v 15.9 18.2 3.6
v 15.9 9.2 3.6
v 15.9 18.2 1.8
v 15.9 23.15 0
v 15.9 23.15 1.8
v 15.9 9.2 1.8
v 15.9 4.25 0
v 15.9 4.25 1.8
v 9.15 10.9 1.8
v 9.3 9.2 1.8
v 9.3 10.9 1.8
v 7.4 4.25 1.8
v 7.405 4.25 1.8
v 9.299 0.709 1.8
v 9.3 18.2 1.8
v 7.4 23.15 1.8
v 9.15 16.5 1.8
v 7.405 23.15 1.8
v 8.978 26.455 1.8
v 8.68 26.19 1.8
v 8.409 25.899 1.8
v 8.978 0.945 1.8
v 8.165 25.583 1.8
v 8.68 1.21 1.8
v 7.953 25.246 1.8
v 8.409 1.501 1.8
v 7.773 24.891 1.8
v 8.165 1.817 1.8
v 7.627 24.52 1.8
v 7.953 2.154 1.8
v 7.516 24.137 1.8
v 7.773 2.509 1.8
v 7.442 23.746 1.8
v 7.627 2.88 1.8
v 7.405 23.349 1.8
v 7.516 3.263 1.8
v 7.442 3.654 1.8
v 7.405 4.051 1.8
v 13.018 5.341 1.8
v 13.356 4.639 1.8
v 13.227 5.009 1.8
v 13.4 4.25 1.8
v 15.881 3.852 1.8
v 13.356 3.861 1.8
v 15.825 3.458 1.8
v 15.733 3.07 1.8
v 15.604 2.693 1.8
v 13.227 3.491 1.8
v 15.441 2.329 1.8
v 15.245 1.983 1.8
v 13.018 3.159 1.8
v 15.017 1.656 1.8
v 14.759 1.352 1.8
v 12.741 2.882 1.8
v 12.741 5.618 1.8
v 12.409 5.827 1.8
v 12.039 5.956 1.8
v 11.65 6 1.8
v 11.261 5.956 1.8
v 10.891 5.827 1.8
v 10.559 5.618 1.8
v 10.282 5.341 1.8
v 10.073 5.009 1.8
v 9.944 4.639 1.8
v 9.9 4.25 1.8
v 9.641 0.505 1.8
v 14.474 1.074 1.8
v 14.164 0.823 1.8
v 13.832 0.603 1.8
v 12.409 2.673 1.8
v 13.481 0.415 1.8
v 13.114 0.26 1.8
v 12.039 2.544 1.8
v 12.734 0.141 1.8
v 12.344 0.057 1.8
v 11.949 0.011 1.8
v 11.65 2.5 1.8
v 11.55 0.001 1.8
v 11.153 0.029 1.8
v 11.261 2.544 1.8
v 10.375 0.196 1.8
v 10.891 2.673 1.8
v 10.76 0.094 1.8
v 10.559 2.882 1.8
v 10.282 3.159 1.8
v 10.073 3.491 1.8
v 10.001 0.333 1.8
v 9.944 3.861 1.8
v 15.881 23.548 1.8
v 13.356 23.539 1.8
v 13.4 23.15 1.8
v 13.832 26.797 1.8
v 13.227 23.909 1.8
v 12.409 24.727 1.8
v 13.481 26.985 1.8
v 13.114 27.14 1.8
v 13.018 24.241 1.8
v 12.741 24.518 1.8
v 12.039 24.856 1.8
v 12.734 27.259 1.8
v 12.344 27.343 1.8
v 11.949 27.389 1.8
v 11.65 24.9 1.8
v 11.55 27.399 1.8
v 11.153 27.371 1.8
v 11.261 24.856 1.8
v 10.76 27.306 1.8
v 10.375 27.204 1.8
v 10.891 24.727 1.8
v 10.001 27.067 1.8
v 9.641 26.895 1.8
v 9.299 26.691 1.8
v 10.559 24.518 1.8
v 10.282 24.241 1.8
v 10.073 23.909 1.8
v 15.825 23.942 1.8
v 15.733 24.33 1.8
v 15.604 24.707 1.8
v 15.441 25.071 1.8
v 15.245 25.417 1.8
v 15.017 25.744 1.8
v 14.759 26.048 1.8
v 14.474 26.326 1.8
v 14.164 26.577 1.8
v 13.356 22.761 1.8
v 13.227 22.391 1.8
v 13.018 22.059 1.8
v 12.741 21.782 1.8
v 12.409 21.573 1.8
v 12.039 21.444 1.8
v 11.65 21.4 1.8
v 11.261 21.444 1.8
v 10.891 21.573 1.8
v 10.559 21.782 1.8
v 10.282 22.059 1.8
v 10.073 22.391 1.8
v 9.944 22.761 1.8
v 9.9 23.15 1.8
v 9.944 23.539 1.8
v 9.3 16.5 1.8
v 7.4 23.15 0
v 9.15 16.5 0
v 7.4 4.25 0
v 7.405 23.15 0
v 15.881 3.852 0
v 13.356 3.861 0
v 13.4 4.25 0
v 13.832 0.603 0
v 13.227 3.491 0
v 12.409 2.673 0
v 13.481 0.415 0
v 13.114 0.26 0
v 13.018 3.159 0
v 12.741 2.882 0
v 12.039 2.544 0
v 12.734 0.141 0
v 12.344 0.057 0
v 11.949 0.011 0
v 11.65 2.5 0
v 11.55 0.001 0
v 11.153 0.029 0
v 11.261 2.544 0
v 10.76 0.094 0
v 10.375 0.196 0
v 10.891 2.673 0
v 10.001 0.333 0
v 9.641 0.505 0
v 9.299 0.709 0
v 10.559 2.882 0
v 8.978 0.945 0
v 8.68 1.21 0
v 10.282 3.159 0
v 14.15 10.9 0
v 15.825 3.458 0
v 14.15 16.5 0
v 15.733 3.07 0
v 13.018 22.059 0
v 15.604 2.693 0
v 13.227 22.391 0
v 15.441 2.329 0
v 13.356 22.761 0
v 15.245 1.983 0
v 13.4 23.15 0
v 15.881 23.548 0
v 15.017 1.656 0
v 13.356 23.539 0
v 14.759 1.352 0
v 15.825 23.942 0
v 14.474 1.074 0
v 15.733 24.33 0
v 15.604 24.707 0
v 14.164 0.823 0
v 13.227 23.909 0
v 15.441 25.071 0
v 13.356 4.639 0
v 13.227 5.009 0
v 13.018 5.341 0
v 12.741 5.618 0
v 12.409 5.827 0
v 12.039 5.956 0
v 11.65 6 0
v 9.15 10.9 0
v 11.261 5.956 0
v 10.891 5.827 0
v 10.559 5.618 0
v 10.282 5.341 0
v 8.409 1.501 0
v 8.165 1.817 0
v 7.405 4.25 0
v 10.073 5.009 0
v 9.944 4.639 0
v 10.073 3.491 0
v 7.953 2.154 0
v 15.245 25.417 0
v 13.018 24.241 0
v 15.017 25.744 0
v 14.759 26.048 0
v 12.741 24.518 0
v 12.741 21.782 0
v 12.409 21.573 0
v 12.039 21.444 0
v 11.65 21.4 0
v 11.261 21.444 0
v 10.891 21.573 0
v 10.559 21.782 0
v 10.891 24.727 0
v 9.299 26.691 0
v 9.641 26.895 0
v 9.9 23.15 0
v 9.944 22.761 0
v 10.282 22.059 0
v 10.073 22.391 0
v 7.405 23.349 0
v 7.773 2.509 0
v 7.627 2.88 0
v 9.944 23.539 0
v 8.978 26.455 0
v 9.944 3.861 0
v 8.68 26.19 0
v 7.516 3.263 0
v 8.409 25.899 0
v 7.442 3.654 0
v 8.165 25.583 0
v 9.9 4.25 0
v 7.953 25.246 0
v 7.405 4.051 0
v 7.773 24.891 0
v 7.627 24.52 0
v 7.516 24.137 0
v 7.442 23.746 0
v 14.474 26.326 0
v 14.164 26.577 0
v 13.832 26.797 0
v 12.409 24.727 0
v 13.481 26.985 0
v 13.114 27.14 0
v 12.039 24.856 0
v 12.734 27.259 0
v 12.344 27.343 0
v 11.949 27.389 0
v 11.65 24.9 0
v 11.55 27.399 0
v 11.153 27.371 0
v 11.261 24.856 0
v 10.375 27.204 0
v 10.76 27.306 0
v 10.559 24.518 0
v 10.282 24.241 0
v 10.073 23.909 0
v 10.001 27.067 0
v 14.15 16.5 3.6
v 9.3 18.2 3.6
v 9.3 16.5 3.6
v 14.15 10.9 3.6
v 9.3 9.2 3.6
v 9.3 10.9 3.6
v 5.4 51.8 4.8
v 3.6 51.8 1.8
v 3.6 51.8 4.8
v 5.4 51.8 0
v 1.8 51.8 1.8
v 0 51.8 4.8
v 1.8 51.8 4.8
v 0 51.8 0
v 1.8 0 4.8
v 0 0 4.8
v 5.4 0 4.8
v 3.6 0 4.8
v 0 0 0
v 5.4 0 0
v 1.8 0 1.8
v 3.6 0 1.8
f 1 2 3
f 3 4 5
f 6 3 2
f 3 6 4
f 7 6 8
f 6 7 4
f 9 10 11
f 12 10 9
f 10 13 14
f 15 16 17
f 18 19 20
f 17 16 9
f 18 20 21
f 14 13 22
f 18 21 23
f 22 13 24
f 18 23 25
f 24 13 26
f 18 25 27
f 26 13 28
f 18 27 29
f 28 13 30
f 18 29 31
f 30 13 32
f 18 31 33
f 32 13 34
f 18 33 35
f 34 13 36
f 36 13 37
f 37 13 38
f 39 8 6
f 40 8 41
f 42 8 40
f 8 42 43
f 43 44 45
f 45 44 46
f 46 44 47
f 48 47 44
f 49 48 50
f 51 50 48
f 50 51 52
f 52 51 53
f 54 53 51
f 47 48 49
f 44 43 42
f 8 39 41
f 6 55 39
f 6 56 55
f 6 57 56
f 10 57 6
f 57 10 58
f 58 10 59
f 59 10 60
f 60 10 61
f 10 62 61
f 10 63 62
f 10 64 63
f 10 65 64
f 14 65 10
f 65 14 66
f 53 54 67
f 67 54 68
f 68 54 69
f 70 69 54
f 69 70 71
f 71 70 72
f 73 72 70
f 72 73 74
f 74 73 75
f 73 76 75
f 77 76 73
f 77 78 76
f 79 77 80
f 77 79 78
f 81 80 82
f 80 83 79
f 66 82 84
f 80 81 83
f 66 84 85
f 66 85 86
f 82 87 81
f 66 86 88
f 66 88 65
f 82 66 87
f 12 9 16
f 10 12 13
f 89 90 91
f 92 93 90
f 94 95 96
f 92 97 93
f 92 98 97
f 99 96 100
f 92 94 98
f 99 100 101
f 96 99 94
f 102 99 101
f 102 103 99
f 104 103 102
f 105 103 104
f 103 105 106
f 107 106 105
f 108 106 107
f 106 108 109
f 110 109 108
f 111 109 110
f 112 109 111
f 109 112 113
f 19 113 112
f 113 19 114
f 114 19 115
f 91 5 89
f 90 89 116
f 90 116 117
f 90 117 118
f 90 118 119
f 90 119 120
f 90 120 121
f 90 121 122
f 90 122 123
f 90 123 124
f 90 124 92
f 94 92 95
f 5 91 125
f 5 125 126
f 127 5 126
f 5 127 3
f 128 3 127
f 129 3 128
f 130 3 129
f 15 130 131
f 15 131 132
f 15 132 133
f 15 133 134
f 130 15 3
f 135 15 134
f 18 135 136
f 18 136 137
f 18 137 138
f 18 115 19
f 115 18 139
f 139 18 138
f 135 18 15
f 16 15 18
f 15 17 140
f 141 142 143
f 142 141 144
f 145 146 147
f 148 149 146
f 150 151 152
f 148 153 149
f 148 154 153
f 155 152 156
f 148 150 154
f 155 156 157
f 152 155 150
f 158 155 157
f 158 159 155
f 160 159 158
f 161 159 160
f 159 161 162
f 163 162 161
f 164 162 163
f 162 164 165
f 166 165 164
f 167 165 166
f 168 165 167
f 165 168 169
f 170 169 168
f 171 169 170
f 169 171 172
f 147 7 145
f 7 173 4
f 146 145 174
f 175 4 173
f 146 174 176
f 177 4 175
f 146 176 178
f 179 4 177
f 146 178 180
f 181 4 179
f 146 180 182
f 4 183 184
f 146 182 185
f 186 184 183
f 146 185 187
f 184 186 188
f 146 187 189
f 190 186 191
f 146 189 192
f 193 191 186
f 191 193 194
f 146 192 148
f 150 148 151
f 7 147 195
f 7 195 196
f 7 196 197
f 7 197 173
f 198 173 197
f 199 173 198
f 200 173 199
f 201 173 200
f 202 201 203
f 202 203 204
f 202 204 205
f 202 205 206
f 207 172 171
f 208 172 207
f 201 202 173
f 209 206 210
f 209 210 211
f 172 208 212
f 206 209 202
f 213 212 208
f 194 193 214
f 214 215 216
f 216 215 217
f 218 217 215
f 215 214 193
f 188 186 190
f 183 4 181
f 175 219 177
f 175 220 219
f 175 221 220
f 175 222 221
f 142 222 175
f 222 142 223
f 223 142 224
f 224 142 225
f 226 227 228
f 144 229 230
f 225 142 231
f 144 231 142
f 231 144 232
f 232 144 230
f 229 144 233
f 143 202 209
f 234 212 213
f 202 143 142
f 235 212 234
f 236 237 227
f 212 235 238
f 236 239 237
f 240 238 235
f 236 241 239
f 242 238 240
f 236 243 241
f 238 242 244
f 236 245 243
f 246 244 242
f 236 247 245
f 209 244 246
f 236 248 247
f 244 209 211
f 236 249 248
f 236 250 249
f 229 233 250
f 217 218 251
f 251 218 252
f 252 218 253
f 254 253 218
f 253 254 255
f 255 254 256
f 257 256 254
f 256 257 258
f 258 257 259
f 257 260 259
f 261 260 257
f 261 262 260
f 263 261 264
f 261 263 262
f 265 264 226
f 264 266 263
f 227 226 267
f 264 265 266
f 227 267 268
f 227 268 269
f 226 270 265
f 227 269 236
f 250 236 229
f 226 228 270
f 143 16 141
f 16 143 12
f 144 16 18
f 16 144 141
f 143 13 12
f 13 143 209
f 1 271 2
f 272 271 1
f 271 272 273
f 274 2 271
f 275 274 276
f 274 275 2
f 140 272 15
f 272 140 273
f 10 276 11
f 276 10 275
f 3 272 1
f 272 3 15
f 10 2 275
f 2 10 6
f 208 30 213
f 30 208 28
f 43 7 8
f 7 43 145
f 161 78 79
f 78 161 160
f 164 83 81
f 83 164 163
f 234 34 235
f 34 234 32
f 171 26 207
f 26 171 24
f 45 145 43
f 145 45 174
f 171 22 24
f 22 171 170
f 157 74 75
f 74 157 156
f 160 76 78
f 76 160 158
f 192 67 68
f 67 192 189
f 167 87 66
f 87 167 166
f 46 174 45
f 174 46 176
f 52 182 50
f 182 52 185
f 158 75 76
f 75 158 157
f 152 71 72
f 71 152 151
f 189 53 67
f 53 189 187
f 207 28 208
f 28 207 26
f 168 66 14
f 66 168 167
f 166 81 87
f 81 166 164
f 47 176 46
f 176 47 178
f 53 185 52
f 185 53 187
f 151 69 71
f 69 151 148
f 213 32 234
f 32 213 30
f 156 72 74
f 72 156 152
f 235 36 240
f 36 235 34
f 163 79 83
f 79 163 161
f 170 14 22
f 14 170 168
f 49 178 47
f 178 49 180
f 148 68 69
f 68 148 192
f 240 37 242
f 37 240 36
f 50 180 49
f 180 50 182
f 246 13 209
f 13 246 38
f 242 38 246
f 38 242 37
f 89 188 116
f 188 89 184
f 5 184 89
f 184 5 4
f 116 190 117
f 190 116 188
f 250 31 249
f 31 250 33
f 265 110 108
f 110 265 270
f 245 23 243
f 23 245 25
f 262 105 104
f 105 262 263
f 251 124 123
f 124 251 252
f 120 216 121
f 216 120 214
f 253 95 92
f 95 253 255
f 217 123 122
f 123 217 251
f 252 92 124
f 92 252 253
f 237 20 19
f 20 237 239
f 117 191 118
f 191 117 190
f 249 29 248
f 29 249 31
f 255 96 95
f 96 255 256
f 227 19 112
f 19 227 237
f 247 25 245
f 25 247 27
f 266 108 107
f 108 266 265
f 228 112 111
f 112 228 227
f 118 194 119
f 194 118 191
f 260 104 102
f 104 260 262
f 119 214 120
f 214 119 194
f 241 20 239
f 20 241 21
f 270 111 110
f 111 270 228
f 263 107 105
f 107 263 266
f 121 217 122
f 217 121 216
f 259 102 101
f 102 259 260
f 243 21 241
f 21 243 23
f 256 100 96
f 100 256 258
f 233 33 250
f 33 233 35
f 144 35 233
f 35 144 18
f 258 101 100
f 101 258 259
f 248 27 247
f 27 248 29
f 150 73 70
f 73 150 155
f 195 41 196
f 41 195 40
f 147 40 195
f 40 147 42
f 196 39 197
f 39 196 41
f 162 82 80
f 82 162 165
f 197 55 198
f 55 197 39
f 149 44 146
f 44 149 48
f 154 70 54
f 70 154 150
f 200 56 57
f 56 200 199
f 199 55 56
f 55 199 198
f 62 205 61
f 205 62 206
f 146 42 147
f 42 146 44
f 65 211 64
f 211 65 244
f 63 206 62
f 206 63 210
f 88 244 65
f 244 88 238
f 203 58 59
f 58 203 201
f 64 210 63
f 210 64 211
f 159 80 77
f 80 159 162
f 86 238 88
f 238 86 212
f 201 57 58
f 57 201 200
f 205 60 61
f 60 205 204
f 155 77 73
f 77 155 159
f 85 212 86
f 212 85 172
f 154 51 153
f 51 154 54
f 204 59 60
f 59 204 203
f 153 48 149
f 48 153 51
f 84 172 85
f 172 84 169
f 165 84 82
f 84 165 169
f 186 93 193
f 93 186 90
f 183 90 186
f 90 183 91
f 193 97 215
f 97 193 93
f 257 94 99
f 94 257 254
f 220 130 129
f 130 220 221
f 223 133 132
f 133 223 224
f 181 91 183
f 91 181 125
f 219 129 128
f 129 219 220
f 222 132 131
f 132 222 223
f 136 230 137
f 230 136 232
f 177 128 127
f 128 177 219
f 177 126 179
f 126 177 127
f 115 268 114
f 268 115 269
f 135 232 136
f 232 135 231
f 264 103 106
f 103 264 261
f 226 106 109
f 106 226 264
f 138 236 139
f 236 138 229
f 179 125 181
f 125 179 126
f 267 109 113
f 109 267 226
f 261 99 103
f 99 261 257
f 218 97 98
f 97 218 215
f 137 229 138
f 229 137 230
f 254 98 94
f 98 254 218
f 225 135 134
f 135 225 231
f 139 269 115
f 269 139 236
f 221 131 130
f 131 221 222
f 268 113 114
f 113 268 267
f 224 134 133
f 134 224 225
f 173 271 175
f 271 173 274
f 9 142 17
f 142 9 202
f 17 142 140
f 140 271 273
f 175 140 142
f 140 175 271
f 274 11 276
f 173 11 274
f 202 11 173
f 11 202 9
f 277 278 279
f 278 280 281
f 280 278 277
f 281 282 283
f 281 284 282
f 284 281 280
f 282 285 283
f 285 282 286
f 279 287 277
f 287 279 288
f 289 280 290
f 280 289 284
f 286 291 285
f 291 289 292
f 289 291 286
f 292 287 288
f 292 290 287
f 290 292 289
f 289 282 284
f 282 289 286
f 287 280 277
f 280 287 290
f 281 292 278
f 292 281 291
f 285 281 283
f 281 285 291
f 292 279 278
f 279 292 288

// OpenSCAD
// Platinenhalter

// Resolution for 3D printing:
$fa = 1;
$fs = 0.4;

// Allgemeines:
delta                  =   0.1; // Standard Durchdringung

// Luft zwischen getrennten Teilen:
luft                   =   0.2;

// Gehäuse Dicke
wand_dicke             =   1.8;

// Schiene:
schiene_laenge         =  50.0;
schiene_tiefe          =   3.0;

// Platine:
platinen_dicke         =   1.6 + luft;

// Schraubenloch
schloch_durchm         =   3.5;
schloch_abstand        =   2.5;

schiene_tot_x          =   schiene_laenge + wand_dicke;
schiene_tot_y          =     2 * wand_dicke + platinen_dicke;
schiene_tot_z          =   schiene_tiefe + wand_dicke;

rundung_durchmesser    =  schloch_durchm + 2 * schloch_abstand;

stand_tot_x            =  rundung_durchmesser;
stand_tot_y            =  schiene_tot_y + 2 * schloch_abstand +
                             2 * rundung_durchmesser;

module schiene() {
    color("red", 1.0) {
        difference() {
            cube([schiene_tot_x,
                  schiene_tot_y,
                  schiene_tot_z]);
            translate([-delta, wand_dicke, wand_dicke])
                cube([schiene_tot_x + 2 * delta,
                      platinen_dicke,
                      schiene_tiefe + delta]);
        };
    }
}

module rundung() {
    translate ([stand_tot_x / 2, stand_tot_x / 2, 0])
        cylinder(d = stand_tot_x, h = wand_dicke);
}

module stand_basis() {
    // Grundplatte:
    translate([0, rundung_durchmesser / 2, 0])
        cube([stand_tot_x,
              stand_tot_y - rundung_durchmesser,
              wand_dicke]);
    
    // Verstärkung:
    translate([stand_tot_x - schiene_tot_z - wand_dicke,
               (stand_tot_y - schiene_tot_y) / 2 - wand_dicke,
               wand_dicke - delta])
        cube([schiene_tot_z + wand_dicke,
              schiene_tot_y + 2 * wand_dicke, 
              wand_dicke + delta]);
    
    // Rundung 1:
    rundung();
    
    // Rundung2:
    translate([0, stand_tot_y - rundung_durchmesser, 0])
        rundung();
}

module bohrloch() {
    cylinder(d = schloch_durchm, h = wand_dicke + 2 * delta);
}

module stand_d() {
    // Bohrloch 1
    translate([stand_tot_x / 2,
               stand_tot_x / 2,
              -delta])
        bohrloch();
    
    // Bohrloch 2
    translate([stand_tot_x / 2,
               stand_tot_y - rundung_durchmesser / 2,
              -delta])
        bohrloch();
    
    // Schienenloch
    translate([(stand_tot_x - schiene_tot_z - luft) / 2,
               (stand_tot_y - schiene_tot_y -luft) / 2,
               -delta])
        cube([schiene_tot_z + luft,
              schiene_tot_y + luft,
              wand_dicke * 2 + 2 * delta]);
}

module stand() {
    difference() {
        stand_basis();
        stand_d();
    }
}

module schiene_aufgestellt() {
    translate([schiene_tot_z, 0, 0])
        rotate([0, -90, 0])
            schiene();
}


module ansicht() {
    translate([(stand_tot_x - schiene_tot_z) / 2,
               (stand_tot_y - schiene_tot_y) / 2,
               0])
        schiene_aufgestellt();
    stand();
}

module druck() {
    translate([schiene_tot_y + 2, 0, 0])
        stand();
    
    translate([schiene_tot_y, 0, 0])
        rotate([0, 0, 90])
            schiene();
}

//ansicht();
druck();
